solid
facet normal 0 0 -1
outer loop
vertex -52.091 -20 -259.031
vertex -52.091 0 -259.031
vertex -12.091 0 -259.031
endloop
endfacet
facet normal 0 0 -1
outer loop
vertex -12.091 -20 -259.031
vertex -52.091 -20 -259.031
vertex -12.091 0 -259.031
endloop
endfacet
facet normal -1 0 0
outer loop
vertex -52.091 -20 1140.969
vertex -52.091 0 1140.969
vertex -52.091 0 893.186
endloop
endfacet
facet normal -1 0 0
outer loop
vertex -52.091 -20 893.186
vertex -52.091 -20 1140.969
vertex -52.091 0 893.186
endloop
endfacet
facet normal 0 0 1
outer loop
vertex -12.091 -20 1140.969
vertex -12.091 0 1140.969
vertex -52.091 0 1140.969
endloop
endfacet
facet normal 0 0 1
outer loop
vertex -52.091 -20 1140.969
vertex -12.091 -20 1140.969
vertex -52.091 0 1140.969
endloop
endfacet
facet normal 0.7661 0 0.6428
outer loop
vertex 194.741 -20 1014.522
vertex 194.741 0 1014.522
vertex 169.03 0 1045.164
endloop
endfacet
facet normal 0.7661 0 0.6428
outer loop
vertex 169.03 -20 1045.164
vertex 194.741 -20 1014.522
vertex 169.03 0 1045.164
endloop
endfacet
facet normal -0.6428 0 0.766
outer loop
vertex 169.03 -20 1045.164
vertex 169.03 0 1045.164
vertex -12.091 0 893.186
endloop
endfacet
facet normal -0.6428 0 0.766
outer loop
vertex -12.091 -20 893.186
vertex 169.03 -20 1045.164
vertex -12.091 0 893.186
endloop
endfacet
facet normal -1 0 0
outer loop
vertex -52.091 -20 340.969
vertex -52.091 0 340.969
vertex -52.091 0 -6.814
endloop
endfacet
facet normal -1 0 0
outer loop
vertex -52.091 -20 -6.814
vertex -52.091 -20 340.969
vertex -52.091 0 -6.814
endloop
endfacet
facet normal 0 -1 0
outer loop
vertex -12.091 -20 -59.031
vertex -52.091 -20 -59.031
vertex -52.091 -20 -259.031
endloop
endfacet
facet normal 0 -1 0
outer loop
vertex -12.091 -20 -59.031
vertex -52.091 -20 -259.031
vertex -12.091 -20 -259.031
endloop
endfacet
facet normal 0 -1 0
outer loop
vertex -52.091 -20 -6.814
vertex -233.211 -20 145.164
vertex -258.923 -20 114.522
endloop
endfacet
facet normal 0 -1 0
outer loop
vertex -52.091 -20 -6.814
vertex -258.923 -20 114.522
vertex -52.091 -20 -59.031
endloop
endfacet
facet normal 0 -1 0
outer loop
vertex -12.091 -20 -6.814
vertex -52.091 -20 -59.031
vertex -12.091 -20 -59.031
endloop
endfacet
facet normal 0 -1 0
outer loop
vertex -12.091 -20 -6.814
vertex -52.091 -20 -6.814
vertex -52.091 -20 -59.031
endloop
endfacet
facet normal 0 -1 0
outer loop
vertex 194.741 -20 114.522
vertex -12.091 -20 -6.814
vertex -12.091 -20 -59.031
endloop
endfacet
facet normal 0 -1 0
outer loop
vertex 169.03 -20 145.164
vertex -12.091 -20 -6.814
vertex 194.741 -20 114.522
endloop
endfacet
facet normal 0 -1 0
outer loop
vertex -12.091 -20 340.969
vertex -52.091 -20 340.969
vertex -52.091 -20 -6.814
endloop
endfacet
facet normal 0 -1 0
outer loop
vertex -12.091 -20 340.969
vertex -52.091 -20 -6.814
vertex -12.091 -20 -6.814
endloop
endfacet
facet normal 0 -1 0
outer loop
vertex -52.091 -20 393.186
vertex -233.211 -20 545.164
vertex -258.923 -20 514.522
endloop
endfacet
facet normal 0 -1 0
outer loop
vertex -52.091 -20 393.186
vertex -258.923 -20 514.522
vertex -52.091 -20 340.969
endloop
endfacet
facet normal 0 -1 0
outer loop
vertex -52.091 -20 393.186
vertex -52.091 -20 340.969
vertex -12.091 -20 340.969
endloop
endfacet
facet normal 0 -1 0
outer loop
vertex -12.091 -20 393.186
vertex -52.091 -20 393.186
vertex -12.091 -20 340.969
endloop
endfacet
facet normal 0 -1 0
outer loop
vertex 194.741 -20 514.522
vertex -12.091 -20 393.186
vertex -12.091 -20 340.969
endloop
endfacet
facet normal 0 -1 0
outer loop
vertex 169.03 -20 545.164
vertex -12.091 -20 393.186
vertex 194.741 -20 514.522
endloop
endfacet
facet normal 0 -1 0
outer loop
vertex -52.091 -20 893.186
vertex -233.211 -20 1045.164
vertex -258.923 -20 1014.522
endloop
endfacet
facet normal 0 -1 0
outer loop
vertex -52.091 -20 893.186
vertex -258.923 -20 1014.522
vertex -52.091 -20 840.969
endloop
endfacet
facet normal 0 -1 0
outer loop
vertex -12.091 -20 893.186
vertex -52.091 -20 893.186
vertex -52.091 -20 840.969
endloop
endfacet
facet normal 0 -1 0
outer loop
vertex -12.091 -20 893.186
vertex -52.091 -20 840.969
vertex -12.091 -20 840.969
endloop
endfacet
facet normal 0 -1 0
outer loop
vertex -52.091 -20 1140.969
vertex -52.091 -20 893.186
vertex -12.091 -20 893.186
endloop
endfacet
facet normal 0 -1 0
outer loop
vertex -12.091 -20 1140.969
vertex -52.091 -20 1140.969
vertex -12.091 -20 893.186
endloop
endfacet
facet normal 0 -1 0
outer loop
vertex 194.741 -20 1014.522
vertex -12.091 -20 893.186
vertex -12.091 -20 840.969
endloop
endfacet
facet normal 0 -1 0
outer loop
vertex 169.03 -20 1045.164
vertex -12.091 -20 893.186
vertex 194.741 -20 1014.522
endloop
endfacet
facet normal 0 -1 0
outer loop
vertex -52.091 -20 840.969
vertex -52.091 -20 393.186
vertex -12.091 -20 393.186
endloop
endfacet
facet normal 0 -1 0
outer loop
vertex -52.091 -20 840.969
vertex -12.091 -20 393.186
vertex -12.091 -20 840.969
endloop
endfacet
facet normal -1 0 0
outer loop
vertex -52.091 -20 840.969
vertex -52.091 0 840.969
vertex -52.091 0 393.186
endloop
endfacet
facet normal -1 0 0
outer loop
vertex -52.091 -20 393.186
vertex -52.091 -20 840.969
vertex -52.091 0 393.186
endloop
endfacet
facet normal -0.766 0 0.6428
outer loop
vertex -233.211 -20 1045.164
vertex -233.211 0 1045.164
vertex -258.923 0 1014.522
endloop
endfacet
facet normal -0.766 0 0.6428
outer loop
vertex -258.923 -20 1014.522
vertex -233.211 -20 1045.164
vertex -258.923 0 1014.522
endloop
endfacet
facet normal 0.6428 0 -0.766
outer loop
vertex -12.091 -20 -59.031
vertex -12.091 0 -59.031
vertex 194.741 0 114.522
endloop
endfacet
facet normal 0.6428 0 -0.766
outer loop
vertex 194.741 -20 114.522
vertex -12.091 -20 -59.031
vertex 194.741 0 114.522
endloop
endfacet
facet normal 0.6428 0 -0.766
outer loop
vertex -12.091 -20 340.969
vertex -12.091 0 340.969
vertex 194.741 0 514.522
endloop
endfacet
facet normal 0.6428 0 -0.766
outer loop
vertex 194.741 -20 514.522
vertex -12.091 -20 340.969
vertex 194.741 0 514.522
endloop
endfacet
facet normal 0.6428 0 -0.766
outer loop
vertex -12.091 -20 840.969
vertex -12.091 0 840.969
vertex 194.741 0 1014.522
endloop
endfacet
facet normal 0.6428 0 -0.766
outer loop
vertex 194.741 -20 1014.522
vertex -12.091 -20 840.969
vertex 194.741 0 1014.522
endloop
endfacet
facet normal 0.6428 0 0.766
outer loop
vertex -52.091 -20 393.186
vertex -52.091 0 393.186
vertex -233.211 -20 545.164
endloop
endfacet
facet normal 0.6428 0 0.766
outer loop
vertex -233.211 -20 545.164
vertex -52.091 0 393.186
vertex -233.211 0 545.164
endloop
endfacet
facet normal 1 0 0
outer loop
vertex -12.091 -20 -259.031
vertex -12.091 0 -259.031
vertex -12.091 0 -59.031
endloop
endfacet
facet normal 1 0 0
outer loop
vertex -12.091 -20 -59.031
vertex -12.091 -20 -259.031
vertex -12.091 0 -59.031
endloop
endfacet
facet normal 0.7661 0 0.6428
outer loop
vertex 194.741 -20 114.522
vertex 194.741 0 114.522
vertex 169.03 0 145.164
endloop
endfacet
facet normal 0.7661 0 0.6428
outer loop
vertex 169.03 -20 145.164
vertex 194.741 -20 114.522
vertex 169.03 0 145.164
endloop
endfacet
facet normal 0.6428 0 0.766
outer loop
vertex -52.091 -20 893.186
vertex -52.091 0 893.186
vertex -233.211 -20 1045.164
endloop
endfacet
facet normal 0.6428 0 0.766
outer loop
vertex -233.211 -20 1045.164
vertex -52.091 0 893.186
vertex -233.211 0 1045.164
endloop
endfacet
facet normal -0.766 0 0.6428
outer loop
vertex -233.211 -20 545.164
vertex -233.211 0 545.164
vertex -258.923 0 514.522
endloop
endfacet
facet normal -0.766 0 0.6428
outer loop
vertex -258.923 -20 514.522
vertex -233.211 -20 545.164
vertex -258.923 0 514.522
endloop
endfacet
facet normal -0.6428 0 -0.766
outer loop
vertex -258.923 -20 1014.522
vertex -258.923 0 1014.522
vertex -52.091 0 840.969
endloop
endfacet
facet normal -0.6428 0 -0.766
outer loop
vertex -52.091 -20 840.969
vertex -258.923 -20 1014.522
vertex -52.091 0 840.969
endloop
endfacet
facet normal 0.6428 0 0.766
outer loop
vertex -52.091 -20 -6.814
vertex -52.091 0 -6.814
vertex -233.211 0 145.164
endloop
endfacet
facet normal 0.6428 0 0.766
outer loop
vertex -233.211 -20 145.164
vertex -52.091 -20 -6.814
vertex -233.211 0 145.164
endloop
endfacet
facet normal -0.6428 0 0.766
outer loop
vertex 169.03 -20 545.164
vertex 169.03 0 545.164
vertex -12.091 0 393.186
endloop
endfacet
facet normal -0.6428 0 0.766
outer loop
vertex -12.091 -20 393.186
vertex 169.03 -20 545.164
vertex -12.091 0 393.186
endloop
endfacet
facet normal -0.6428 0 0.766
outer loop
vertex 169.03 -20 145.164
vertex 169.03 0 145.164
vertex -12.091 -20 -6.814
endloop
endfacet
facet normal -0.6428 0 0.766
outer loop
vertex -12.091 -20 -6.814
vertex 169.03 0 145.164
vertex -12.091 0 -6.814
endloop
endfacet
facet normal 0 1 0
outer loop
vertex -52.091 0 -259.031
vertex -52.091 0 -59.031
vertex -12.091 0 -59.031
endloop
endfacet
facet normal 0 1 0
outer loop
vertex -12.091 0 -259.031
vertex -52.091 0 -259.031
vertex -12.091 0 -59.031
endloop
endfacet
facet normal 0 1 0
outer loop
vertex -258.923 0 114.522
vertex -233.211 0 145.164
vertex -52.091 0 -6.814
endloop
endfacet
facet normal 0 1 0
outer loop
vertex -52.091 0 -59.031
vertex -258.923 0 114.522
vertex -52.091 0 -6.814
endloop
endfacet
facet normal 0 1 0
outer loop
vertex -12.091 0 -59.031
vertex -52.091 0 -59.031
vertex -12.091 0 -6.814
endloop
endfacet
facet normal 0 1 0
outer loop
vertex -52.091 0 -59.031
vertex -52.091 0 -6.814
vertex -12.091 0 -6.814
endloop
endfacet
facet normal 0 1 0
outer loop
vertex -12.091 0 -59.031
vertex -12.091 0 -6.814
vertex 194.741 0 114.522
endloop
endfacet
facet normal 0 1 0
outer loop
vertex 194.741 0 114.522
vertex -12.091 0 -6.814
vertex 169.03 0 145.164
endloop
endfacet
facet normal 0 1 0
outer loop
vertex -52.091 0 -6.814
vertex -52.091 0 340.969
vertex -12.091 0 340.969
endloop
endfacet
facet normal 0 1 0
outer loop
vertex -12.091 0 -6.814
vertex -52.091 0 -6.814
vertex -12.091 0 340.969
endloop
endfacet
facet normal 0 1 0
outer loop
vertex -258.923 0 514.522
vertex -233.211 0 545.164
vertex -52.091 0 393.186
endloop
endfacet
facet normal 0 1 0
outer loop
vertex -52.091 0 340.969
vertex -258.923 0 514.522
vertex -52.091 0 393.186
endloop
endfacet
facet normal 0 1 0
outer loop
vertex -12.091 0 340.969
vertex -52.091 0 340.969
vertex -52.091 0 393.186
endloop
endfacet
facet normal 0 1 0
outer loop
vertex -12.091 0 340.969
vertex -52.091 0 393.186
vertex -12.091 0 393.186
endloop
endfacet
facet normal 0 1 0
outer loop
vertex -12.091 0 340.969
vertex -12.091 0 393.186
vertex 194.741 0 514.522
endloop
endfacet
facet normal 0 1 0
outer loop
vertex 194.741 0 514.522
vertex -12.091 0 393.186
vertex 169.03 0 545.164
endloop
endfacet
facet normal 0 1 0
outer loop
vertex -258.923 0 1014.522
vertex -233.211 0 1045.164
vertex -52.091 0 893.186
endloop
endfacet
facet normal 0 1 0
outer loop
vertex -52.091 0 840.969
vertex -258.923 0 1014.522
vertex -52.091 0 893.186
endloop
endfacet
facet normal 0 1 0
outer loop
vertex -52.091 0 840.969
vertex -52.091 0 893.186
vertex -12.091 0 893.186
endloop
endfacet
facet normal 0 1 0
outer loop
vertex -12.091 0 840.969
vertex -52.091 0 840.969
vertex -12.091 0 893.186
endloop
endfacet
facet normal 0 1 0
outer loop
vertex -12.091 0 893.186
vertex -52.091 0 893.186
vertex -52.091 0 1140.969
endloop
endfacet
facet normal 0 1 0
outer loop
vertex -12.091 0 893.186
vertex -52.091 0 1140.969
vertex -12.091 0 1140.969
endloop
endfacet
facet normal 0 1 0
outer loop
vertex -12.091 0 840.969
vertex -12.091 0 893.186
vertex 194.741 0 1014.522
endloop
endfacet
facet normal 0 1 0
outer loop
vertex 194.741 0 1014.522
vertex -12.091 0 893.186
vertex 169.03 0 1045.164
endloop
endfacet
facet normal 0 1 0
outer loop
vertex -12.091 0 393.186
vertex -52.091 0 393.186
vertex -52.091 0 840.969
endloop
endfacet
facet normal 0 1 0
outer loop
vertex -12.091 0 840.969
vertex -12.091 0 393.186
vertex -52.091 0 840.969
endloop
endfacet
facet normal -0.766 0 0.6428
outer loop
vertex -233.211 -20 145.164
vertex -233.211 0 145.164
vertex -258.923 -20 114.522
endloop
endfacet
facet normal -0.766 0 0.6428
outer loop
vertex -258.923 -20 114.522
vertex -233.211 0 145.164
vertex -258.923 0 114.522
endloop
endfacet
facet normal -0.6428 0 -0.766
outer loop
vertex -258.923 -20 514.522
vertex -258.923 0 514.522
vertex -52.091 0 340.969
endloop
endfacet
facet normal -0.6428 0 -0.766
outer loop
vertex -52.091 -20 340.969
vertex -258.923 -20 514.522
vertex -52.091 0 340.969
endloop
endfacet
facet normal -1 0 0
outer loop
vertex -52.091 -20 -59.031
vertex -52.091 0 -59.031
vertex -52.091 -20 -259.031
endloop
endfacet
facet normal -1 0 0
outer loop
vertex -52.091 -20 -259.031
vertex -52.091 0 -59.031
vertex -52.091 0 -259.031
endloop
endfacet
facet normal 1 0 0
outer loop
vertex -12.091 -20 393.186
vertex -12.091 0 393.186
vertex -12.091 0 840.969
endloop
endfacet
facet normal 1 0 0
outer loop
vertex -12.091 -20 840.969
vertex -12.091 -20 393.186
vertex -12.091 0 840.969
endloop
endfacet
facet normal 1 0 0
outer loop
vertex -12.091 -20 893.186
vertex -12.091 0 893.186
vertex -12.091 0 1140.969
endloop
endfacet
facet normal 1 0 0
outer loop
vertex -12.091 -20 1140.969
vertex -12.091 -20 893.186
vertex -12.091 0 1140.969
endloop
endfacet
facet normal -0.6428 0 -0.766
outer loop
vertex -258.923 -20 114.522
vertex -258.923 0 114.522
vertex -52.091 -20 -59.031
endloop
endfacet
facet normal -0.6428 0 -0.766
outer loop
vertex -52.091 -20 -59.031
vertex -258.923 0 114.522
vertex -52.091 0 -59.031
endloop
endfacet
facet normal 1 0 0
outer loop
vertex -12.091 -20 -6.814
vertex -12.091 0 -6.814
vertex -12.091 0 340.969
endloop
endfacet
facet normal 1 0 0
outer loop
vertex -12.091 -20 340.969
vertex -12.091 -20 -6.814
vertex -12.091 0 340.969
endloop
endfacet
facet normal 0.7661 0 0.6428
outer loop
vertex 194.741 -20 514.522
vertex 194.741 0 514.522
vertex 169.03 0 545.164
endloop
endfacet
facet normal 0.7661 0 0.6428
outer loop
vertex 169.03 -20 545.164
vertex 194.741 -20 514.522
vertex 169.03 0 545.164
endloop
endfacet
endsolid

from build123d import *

# Parameters (mm, degrees)
F1_DEPTH = 20


with BuildPart() as f1:
    # F0 (on Front) → F1 (new body)
    with BuildSketch(Plane.XZ):
        Polygon((-52.090994, 840.9694), (-52.090994, 893.185692), (-233.21149, 1045.163832), (-258.922994, 1014.522055), align=None)
        Polygon((169.029501, 1045.163832), (-12.090994, 893.185692), (-12.090994, 840.9694), (194.741005, 1014.522055), align=None)
        Polygon((-12.090994, 1140.9694), (-52.090994, 1140.9694), (-52.090994, 893.185692), (-52.090994, 840.9694), (-52.090994, 393.185692), (-52.090994, 340.9694), (-52.090994, -6.814308), (-52.090994, -59.0306), (-52.090994, -259.0306), (-12.090994, -259.0306), (-12.090994, -59.0306), (-12.090994, -6.814308), (-12.090994, 340.9694), (-12.090994, 393.185692), (-12.090994, 840.9694), (-12.090994, 893.185692), align=None)
        Polygon((-52.090994, 340.9694), (-52.090994, 393.185692), (-233.21149, 545.163832), (-258.922994, 514.522055), align=None)
        Polygon((169.029501, 545.163832), (-12.090994, 393.185692), (-12.090994, 340.9694), (194.741005, 514.522055), align=None)
        Polygon((-52.090994, -59.0306), (-52.090994, -6.814308), (-233.21149, 145.163832), (-258.922994, 114.522055), align=None)
        Polygon((169.029501, 145.163832), (-12.090994, -6.814308), (-12.090994, -59.0306), (194.741005, 114.522055), align=None)
    extrude(amount=F1_DEPTH)


solid = f1.part
